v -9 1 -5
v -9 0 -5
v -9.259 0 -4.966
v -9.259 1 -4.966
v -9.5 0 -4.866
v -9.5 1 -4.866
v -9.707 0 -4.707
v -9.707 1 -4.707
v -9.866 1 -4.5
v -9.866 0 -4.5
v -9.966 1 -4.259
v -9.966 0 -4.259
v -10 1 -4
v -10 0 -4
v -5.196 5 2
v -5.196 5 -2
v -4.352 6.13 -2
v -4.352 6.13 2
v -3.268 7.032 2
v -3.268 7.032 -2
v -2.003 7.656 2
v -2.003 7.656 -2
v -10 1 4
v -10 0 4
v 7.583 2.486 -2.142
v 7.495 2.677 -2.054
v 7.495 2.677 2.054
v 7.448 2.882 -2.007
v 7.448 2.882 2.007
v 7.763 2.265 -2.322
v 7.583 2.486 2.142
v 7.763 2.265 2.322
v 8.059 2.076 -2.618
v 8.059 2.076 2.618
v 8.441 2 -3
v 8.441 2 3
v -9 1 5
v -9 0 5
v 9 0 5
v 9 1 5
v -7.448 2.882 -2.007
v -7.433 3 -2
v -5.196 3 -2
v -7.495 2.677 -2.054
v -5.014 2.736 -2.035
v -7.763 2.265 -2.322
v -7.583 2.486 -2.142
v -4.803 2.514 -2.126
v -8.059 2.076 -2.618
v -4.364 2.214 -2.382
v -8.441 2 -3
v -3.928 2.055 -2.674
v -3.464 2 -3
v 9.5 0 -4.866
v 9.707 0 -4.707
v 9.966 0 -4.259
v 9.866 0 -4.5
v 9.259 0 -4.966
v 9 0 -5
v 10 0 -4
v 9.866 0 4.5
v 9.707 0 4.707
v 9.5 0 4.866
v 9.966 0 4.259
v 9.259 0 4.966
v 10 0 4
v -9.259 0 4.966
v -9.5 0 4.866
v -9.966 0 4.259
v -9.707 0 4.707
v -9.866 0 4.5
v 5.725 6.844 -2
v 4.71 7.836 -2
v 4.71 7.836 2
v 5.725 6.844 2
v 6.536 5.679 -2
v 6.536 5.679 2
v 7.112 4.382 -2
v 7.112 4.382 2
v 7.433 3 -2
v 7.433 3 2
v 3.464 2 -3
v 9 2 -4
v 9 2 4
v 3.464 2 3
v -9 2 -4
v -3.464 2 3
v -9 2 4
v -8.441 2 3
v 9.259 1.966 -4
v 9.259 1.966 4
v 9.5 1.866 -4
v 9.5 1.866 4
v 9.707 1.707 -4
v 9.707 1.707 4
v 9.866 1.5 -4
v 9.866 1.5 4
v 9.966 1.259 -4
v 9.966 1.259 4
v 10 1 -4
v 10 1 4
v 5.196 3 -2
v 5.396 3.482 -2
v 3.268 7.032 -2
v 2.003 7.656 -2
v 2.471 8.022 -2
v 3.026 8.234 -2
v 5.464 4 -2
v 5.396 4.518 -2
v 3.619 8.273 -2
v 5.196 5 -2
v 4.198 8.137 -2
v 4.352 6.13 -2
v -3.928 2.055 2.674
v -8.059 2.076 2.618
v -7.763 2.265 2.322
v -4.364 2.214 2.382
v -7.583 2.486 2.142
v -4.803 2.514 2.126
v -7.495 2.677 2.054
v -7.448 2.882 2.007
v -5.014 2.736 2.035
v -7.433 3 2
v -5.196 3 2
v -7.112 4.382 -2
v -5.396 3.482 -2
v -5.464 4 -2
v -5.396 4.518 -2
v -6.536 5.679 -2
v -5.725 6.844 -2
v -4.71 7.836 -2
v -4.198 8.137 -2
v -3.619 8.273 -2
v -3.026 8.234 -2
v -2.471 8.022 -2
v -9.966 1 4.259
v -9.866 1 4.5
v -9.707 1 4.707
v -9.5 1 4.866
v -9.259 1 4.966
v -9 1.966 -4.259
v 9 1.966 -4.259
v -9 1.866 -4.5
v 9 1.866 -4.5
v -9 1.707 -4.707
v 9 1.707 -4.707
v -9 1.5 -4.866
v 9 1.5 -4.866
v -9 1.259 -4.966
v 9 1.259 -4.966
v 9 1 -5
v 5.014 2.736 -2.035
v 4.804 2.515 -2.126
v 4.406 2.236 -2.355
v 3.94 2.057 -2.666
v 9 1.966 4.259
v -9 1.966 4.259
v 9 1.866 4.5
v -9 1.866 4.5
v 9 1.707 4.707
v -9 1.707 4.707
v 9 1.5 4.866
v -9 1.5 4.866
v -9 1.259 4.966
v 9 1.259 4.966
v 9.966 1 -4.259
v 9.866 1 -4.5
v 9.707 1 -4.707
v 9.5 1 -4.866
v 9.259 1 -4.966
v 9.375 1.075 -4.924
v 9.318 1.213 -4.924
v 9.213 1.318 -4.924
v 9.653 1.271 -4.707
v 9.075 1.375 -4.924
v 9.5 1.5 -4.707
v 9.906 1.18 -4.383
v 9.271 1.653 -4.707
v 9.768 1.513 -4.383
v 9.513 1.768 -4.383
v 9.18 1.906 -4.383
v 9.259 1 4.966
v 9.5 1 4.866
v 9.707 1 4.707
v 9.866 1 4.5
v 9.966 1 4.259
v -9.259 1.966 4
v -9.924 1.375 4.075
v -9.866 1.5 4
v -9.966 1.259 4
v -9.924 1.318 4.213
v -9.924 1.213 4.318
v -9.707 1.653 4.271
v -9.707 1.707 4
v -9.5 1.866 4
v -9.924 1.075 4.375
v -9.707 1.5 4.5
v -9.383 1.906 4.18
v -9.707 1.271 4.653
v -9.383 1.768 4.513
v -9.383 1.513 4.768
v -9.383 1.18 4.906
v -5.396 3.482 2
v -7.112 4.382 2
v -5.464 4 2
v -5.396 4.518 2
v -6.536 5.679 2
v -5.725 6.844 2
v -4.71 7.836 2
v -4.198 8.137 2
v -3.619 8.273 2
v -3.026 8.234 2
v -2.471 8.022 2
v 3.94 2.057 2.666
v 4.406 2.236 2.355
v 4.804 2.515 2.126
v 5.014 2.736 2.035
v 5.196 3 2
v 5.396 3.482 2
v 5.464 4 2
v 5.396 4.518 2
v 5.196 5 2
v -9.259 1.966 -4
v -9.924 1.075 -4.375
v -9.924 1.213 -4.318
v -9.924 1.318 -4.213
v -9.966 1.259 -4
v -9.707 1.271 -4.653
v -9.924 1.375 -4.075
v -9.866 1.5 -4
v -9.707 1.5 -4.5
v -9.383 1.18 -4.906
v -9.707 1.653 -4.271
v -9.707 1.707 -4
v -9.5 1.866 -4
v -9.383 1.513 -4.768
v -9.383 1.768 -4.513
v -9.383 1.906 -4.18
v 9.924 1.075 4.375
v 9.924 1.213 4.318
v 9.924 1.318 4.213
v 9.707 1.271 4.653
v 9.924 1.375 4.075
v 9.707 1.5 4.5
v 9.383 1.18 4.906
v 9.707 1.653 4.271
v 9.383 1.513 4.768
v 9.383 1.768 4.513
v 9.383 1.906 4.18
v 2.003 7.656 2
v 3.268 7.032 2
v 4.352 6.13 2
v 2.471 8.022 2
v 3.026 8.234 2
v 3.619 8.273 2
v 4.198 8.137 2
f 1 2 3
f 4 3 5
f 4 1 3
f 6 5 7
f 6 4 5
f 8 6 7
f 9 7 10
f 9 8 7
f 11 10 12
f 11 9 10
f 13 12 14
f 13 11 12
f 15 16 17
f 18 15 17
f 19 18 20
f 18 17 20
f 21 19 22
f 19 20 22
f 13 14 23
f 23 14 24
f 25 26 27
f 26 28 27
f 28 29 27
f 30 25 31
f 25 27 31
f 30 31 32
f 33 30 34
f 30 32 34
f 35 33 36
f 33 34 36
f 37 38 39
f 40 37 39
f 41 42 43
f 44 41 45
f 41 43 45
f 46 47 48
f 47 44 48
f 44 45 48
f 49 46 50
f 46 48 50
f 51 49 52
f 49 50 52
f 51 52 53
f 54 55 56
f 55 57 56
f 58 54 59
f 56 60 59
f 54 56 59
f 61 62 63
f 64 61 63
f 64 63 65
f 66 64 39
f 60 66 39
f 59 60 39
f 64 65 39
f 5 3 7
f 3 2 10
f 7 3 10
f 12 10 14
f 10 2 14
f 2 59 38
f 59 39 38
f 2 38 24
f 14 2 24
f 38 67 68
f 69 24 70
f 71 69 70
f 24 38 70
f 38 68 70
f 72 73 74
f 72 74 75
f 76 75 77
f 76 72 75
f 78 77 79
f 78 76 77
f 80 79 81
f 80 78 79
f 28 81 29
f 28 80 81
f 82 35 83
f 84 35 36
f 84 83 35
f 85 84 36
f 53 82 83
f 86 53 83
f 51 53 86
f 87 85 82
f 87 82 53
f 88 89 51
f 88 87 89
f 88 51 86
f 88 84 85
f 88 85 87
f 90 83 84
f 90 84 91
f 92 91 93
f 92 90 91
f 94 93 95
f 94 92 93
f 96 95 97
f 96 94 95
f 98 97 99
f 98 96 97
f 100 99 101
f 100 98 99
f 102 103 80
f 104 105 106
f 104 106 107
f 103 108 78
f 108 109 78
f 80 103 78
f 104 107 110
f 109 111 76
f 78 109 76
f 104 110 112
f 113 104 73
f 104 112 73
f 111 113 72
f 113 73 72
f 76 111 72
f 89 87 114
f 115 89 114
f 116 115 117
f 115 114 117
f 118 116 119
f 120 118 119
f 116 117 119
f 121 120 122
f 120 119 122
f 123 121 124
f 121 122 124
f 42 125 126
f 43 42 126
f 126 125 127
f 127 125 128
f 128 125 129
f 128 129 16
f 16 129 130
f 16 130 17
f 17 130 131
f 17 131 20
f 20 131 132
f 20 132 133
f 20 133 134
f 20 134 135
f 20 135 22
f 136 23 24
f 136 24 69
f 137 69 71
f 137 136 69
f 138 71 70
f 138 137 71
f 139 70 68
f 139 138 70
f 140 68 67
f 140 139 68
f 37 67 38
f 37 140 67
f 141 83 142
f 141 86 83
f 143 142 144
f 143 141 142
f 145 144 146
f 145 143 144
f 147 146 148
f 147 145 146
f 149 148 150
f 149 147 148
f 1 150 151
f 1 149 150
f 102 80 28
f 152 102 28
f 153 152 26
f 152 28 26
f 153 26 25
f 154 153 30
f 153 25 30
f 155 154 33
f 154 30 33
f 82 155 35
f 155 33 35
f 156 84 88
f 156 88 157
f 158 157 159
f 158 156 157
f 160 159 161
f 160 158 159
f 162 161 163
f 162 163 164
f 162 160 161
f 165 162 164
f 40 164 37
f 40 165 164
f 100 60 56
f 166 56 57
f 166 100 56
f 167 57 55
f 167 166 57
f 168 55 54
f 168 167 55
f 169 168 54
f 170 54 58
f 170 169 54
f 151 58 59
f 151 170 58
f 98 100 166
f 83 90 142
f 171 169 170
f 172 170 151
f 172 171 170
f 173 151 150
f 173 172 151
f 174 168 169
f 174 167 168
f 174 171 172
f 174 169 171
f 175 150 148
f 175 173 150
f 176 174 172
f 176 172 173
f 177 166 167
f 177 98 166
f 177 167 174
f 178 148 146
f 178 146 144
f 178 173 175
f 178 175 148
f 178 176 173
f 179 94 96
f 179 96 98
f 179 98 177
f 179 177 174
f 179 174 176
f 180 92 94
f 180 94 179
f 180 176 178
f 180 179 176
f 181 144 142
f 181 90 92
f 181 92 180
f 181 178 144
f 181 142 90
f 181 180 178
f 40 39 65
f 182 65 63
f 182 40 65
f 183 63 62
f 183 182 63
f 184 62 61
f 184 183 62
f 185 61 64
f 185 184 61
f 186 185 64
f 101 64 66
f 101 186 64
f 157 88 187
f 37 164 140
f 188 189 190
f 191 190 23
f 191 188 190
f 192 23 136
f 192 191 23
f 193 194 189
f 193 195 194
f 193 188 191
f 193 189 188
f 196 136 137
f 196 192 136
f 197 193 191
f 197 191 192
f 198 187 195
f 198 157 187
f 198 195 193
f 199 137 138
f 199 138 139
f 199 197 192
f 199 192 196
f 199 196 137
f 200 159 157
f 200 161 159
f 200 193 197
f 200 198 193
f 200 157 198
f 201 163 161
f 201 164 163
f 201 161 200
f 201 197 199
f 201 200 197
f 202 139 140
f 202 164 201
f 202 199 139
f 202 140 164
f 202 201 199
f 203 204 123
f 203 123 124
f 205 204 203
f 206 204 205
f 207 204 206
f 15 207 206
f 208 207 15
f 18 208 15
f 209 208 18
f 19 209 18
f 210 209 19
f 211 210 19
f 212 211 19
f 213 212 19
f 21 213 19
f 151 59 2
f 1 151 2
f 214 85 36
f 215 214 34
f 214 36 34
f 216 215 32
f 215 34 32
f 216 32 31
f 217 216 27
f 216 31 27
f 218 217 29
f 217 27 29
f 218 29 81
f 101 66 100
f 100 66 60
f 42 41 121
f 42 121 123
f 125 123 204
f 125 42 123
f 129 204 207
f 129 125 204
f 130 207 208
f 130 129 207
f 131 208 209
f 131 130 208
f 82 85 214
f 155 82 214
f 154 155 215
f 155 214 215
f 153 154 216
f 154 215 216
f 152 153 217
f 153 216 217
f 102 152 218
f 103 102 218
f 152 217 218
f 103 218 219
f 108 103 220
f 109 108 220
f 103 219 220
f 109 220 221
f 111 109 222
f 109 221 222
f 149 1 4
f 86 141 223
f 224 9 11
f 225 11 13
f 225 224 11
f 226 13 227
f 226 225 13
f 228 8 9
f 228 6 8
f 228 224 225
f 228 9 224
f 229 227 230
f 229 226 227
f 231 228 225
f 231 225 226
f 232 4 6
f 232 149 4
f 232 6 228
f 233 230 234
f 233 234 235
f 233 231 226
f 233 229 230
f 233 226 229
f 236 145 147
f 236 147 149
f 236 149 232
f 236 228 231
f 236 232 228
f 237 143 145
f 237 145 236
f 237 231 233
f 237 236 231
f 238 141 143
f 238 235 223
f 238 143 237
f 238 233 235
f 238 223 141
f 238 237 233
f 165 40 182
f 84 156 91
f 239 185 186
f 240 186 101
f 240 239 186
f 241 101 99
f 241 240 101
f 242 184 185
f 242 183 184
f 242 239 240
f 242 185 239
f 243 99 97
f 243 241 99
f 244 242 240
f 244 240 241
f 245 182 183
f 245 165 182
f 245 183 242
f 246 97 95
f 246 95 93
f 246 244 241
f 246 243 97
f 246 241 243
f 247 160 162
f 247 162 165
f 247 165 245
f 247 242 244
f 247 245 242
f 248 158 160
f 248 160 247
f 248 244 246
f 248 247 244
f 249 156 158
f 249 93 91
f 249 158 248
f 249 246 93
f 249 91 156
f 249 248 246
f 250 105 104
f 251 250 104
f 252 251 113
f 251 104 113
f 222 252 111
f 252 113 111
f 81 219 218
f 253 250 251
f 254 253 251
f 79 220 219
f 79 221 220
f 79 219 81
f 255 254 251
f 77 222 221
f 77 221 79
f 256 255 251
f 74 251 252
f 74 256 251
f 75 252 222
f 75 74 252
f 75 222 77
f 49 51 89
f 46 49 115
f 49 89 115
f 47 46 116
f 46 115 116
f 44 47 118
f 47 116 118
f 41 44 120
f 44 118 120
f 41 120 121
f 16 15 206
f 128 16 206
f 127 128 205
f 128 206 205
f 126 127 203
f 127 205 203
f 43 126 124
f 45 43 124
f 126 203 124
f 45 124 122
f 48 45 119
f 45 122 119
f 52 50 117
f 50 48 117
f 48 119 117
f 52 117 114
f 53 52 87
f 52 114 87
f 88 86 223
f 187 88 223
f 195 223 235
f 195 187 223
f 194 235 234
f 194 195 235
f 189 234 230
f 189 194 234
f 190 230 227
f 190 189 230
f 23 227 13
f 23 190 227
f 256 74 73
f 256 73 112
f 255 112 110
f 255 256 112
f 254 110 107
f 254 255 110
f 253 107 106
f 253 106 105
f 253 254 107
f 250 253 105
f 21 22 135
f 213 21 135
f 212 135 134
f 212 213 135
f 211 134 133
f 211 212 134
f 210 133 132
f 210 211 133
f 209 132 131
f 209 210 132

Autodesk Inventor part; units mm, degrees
ref_plane "YZ Plane" through (0, 0, 0) normal (1, 0, 0) x (0, 1, 0)
ref_plane "XZ Plane" through (0, 0, 0) normal (0, 1, 0) x (-1, 0, 0)
ref_plane "XY Plane" through (0, 0, 0) normal (0, 0, 1) x (1, 0, 0)
sketch "Sketch1" plane through (0, 0, 0) normal (0, 1, 0) x (-1, 0, 0)
  line L0 (10, 5) -> (-10, 5)
  line L1 (-10, 5) -> (-10, -5)
  line L2 (-10, -5) -> (10, -5)
  line L3 (10, -5) -> (10, 5)
  line L4 (10, 5) -> (-10, -5) construction
  line L5 (-10, 5) -> (10, -5) construction
  point P0 (0, 0)
  dimension "d0" = 20
  dimension "d1" = 10
extrude "Extrusion1" add sketch "Sketch1" along normal blind 2
sketch "Sketch2" plane through (0, 2, 0) normal (0, 1, 0) x (1, 0, 0)
  line L0 (-10, -5) -> (10, -5) construction
  line L1 (10, -5) -> (10, 5) construction
  line L2 (10, 5) -> (-10, 5) construction
  line L3 (-10, 5) -> (-10, -5) construction
  line L4 (-10, 5) -> (-10, -5) construction
  line L5 (-10, 0) -> (10, 0) construction
  point P0 (0, 0)
ref_plane "Work Plane1" through (-10, 2, 0) normal (0, 0, 1) x (1, 0, 0)
sketch "Sketch3" plane through (-10, 2, 0) normal (0, 0, 1) x (1, 0, 0)
  line L0 (0, 0) -> (20, 0) construction
  line L1 (2.5, 0) -> (4, 0)
  line L2 (0, 0) -> (20, 0) projected
  line L3 (16, 0) -> (17.5, 0)
  arc A0 (16, 0) -> (12.0028, 5.6558) centre (10, 0) ccw
  arc A1 (7.9972, 5.6558) -> (4, 0) centre (10, 0) ccw
  arc A2 (17.5, 0) -> (12.5036, 7.0698) centre (10, 0) ccw
  arc A3 (7.4964, 7.0698) -> (2.5, 0) centre (10, 0) ccw
  line L4 (10, 0) -> (10, 7.5) construction
  line L5 (10, 0) -> (12.5036, 7.0698)
  line L6 (10, 0) -> (10, 7.5) construction
  line L7 (10, 0) -> (10, 7.5) construction
  line L8 (10, 0) -> (7.4964, 7.0698)
  line L9 (10, 0) -> (10, 7.5) construction
  point P0 (10, -2)
  point P1 (7.1395, 6.9331)
  point P2 (12.8605, 6.9331)
  point P3 (7.7742, 5.5719)
  point P4 (12.2258, 5.5719)
  point P5 (6.1541, 6.4389)
  point P6 (13.8459, 6.4389)
  dimension "d14" = 19.5
  dimension "d16" = 19.5
extrude "Extrusion2" add sketch "Sketch3" along normal blind 2 and the other way blind 2 contours A3 L8 A1 L1 | A0 L5 A2 L2
fillet "Fillet1" radius 2 2 edges at (-2.5036, 9.0698, 0) (2.5036, 9.0698, 0)
fillet "Fillet2" radius 1 8 edges at (0, 2, 5) (10, 2, 0) (0, 2, -5) (-10, 2, 0) (10, 1, -5) (-10, 1, -5) (-10, 1, 5) (10, 1, 5)
fillet "Fillet4" radius 2 2 edges at (-6, 2, 0) (6, 2, 0)
fillet "Fillet4" radius 1 6 edges at (6.75, 2, 2) (7.5, 2, 0) (6.75, 2, -2) (-6.75, 2, 2) (-7.5, 2, 0) (-6.75, 2, -2)
properties part number "cable_holder"
